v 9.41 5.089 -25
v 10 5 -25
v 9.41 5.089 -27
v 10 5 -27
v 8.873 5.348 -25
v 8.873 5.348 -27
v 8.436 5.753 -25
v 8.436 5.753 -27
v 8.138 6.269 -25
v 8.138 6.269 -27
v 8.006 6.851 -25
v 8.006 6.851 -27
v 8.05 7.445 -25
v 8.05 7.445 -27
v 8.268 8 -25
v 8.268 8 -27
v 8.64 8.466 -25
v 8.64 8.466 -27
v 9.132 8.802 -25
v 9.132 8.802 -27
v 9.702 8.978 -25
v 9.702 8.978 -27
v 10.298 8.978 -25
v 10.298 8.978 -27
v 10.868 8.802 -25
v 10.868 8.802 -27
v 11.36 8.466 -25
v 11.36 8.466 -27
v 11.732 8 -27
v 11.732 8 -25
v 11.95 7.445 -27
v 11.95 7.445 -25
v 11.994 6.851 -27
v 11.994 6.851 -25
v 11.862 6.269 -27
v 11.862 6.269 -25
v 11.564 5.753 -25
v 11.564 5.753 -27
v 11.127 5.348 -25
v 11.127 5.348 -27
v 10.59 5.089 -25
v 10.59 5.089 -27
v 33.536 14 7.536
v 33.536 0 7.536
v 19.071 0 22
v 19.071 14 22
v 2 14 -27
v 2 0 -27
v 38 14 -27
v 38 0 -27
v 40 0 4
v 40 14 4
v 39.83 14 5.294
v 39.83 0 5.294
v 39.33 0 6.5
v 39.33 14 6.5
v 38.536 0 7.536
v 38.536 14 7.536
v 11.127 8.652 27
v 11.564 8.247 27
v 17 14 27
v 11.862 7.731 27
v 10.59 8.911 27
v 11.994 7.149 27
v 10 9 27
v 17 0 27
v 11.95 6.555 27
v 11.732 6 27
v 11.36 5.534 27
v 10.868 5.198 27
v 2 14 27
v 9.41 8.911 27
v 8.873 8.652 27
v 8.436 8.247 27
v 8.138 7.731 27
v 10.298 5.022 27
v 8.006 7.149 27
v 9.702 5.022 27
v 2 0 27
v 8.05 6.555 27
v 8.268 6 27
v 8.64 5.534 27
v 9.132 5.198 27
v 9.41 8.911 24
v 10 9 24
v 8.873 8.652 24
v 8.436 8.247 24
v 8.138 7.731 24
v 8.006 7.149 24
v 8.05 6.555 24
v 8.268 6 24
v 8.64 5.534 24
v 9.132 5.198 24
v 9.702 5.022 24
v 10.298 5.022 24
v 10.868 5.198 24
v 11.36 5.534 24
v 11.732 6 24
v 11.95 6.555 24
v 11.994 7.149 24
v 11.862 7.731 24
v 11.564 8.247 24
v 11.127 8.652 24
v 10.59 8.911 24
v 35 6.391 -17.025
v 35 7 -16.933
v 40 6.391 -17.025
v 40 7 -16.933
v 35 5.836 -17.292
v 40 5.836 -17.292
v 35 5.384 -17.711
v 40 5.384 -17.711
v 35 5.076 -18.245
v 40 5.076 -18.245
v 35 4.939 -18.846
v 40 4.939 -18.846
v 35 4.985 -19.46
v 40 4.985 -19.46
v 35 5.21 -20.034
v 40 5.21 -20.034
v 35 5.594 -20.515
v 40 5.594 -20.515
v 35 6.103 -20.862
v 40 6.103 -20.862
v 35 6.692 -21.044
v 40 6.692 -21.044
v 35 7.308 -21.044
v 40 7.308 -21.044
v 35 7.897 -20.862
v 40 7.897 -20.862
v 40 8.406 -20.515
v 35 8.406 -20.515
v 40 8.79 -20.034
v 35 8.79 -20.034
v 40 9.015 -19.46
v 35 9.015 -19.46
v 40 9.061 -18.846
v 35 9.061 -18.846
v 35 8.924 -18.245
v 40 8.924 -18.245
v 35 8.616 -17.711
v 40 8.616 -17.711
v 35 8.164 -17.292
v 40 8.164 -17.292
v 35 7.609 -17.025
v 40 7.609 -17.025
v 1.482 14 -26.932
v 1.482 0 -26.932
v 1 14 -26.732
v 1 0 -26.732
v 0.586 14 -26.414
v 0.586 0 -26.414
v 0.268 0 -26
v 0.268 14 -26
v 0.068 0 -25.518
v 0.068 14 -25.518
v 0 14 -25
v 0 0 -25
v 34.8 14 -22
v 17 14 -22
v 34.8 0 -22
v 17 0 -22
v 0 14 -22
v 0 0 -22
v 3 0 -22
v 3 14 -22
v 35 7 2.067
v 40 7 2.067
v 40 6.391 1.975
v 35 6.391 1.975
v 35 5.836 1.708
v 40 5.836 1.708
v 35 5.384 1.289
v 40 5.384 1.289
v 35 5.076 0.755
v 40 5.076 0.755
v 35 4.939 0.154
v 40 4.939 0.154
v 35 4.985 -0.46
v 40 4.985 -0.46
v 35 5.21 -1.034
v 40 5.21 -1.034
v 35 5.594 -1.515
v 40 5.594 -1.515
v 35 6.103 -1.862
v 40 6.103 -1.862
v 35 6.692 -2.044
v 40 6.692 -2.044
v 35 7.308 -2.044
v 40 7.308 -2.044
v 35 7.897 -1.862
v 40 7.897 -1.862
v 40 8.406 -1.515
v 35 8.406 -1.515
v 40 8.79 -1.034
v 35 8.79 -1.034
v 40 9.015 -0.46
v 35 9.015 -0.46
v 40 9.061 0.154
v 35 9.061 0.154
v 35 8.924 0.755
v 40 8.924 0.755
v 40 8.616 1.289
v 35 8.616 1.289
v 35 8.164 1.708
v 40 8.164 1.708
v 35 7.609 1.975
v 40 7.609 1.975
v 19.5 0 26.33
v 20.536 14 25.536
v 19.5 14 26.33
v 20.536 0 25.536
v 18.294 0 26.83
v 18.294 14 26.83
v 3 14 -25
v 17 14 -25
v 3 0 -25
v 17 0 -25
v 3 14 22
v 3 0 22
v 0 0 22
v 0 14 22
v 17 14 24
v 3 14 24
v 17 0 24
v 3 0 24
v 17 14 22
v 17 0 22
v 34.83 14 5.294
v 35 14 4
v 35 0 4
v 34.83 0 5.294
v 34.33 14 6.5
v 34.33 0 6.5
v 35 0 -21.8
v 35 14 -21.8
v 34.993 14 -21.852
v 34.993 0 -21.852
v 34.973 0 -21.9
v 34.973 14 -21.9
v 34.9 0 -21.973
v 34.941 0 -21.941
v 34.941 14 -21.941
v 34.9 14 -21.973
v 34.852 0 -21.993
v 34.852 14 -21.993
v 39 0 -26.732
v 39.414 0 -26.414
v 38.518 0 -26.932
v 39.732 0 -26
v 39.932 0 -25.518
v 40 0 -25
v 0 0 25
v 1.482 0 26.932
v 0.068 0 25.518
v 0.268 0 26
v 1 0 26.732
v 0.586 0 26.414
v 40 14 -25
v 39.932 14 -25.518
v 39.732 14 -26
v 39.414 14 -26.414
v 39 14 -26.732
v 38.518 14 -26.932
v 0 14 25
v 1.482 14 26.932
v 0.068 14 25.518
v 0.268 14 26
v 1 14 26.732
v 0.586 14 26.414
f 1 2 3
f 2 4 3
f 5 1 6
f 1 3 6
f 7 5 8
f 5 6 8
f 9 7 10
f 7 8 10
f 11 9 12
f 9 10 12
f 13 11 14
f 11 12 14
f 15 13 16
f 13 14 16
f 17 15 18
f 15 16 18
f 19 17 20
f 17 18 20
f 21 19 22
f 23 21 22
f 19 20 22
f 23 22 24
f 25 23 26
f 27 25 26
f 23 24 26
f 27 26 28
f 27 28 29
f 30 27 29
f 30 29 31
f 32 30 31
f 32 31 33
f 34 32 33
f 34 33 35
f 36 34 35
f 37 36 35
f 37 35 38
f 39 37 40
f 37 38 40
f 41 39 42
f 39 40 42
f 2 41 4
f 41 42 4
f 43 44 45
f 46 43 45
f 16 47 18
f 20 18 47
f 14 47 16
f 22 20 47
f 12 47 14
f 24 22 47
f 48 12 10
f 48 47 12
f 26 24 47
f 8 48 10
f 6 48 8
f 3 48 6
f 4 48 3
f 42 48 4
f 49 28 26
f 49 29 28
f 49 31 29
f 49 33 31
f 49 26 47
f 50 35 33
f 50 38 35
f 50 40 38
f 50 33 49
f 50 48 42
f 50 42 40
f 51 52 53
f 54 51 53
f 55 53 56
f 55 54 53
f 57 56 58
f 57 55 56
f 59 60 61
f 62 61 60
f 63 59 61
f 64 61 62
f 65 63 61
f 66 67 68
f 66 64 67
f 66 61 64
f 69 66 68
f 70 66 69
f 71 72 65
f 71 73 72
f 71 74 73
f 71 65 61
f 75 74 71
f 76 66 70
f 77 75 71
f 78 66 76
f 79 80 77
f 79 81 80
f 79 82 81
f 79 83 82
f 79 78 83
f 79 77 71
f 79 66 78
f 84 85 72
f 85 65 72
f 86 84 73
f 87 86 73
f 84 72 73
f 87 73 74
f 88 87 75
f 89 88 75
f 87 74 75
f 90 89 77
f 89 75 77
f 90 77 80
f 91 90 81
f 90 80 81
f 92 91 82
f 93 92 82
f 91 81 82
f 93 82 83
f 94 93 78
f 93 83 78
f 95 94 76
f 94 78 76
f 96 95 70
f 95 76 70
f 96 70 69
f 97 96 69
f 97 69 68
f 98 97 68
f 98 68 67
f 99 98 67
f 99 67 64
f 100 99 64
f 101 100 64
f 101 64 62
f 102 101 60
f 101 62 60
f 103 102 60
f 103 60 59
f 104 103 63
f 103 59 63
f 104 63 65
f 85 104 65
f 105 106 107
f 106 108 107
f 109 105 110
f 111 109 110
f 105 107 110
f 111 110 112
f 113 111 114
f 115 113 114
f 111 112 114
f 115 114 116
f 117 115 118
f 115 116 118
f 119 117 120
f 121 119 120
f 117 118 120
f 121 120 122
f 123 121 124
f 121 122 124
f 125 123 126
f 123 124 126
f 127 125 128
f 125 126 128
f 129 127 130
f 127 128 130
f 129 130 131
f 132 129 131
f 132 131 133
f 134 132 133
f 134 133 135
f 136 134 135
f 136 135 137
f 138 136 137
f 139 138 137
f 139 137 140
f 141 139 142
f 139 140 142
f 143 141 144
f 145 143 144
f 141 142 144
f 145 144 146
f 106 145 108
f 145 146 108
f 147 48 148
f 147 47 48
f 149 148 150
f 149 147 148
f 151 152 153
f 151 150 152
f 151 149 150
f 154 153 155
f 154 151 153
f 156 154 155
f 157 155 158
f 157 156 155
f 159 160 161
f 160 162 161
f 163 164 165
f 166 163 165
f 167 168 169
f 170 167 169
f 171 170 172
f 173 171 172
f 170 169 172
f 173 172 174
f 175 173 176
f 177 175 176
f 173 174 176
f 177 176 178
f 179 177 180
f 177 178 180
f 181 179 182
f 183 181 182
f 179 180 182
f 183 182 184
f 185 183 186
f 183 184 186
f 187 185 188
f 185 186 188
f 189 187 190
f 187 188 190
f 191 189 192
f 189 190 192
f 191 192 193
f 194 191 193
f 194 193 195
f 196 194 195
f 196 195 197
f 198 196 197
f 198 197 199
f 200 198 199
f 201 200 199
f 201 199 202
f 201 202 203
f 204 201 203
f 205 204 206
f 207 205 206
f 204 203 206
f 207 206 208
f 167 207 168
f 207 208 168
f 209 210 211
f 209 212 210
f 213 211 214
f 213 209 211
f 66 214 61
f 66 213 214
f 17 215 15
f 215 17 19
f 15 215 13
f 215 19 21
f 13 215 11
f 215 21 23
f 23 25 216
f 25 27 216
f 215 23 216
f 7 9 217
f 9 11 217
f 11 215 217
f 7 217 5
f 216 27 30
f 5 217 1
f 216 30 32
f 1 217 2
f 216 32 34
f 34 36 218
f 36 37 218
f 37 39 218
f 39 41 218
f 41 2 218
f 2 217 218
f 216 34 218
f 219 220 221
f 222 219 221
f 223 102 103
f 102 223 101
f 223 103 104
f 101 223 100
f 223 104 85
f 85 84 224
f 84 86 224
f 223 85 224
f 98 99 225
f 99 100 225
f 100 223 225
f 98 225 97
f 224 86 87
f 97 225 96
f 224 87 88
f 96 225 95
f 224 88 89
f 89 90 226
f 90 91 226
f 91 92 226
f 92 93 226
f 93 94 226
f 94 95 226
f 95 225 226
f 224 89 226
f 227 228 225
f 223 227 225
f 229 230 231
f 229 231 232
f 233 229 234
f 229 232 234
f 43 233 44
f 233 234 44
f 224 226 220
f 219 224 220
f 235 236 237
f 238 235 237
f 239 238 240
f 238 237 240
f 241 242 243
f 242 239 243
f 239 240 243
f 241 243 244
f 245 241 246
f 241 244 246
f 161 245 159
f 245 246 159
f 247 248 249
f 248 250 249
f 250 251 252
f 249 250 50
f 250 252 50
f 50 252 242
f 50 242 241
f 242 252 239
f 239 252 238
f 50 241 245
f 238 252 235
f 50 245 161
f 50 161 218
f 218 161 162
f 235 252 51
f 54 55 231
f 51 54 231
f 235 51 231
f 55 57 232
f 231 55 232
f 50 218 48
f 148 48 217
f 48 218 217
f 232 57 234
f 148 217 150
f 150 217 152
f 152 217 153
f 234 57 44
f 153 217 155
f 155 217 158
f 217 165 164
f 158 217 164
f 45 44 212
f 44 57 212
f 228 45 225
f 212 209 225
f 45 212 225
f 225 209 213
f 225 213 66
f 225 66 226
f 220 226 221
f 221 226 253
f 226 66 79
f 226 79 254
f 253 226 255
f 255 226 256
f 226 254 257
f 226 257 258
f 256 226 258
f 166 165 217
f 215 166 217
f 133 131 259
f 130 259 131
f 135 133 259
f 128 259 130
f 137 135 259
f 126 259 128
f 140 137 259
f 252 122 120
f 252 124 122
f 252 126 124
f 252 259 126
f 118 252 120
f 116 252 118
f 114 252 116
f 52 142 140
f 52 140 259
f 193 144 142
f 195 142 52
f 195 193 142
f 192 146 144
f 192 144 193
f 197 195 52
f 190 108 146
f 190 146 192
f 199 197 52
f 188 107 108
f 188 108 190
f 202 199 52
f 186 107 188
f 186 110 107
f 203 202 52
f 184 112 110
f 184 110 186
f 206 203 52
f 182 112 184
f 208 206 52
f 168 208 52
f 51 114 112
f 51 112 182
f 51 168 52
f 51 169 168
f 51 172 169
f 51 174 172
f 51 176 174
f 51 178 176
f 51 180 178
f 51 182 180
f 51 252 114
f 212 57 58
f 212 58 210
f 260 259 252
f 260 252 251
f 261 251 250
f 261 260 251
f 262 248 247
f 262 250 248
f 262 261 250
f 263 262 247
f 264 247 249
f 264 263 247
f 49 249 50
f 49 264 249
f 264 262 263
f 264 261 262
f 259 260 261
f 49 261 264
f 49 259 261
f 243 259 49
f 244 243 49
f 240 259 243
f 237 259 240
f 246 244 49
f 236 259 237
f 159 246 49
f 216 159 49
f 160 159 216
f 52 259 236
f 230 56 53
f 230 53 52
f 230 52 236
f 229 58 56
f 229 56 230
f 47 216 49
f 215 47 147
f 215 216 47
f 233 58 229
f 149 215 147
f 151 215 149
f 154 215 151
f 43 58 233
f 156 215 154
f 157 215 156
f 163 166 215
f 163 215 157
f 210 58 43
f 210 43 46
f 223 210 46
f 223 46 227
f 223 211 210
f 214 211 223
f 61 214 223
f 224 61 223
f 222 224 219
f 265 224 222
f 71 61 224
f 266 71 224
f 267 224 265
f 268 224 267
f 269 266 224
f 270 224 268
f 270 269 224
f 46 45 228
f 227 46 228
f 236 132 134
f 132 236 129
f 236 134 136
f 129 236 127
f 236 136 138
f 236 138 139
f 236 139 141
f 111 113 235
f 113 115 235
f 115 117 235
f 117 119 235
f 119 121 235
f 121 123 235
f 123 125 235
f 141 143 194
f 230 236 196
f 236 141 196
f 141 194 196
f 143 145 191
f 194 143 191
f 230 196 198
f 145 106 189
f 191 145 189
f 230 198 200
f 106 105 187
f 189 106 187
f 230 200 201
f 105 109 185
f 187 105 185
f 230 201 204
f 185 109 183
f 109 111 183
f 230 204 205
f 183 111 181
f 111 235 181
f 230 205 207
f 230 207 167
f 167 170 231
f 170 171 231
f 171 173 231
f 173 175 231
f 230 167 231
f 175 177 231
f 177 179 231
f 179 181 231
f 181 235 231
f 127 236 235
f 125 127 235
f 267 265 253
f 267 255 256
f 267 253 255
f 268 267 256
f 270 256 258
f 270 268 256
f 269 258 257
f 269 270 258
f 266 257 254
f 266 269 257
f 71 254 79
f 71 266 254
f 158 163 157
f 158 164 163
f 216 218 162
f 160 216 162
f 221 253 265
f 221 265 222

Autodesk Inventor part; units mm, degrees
ref_plane "YZ Plane" through (0, 0, 0) normal (1, 0, 0) x (0, 1, 0)
ref_plane "XZ Plane" through (0, 0, 0) normal (0, 1, 0) x (-1, 0, 0)
ref_plane "XY Plane" through (0, 0, 0) normal (0, 0, 1) x (1, 0, 0)
sketch "Skizze1" plane through (0, 0, 0) normal (0, 1, 0) x (-1, 0, 0)
  line L0 (0, -22) -> (0, -27)
  line L1 (0, -27) -> (-40, -27)
  line L2 (-40, -27) -> (-40, 4)
  line L3 (-17, 27) -> (0, 27)
  line L4 (0, 27) -> (0, 22)
  line L5 (0, -22) -> (-3, -22)
  line L6 (-3, -22) -> (-3, -25)
  line L7 (-3, -25) -> (-17, -25)
  line L8 (-17, -25) -> (-17, -22)
  line L9 (-17, -22) -> (-35, -22)
  line L10 (-35, -22) -> (-35, 4)
  line L11 (-17, 24) -> (-17, 24)
  line L12 (-17, 24) -> (-3, 24)
  line L13 (-3, 24) -> (-3, 22)
  line L14 (-3, 22) -> (0, 22)
  line L15 (0, 0) -> (-33.6444, 0) construction
  arc A0 (-33.5355, 7.5355) -> (-35, 4) centre (-30, 4) ccw
  line L16 (-33.5355, 7.5355) -> (-19.0711, 22)
  line L17 (-19.0711, 22) -> (-17, 22)
  line L18 (-17, 22) -> (-17, 24)
  line L19 (-17, 24) -> (-17, 24)
  arc A1 (-38.5355, 7.5355) -> (-40, 4) centre (-35, 4) ccw
  line L20 (-38.5355, 7.5355) -> (-20.5355, 25.5355)
  arc A2 (-17, 27) -> (-20.5355, 25.5355) centre (-17, 22) ccw
  point P0 (-1.5, 22)
  dimension "d2" = 5
  dimension "d3" = 40
  dimension "d4" = 3
  dimension "d5" = 14
  dimension "d6" = 54
  dimension "d7" = 3
  dimension "d8" = 2
  dimension "d12" = 26
  dimension "d16" = 2
  dimension "d17" = 3
  dimension "d18" = 5
  dimension "d19" = 5
  dimension "d20" = 5
  dimension "d21" = 45
extrude "Extrusion1" add sketch "Skizze1" along normal blind 14
fillet "Rundung1" radius 2 3 edges at (0, 7, -27) (40, 7, -27) (0, 7, 27)
fillet "Rundung2" radius 0.2 1 edges at (35, 7, -22)
sketch "Skizze2" plane through (35, 0, 4) normal (-1, 0, 0) x (0, 0, 1)
  line L0 (-31, 14) -> (-31, 0) projected
  point P0 (-4, 0)
  point P1 (-23, 7)
  point P2 (-4, 7)
  point P3 (-31, 7)
  dimension "d26" = 19
  dimension "d27" = 8
hole "Bohrung1" at (35, 7, -19) at (35, 7, 0) direction (1, 0, 0) diameter 4.134 depth 5 thread size "M5x0.8" class "6H" standard "ISO Metric profile"
sketch "Skizze3" plane through (3, 0, -25) normal (0, 0, 1) x (1, 0, 0)
  line L0 (-3, 14) -> (-1, 14) projected
  line L1 (-1, 14) -> (-1, 0) projected
  line L2 (-1, 0) -> (-3, 0) projected
  line L3 (-3, 0) -> (-3, 14) projected
  point P0 (-3, 0)
  point P1 (7, 7)
  point P2 (-3, 7)
  dimension "d42" = 10
hole "Bohrung2" at (10, 7, -25) direction (0, 0, -1) diameter 4 end through all
sketch "Skizze5" plane through (17, 0, 24) normal (0, 0, -1) x (-1, 0, 0)
  line L0 (17, 14) -> (17, 0) projected
  point P0 (7, 7)
  point P1 (17, 7)
  dimension "d44" = 10
hole "Bohrung3" at (10, 7, 24) direction (0, 0, 1) diameter 4 end through all
properties part number "114"
